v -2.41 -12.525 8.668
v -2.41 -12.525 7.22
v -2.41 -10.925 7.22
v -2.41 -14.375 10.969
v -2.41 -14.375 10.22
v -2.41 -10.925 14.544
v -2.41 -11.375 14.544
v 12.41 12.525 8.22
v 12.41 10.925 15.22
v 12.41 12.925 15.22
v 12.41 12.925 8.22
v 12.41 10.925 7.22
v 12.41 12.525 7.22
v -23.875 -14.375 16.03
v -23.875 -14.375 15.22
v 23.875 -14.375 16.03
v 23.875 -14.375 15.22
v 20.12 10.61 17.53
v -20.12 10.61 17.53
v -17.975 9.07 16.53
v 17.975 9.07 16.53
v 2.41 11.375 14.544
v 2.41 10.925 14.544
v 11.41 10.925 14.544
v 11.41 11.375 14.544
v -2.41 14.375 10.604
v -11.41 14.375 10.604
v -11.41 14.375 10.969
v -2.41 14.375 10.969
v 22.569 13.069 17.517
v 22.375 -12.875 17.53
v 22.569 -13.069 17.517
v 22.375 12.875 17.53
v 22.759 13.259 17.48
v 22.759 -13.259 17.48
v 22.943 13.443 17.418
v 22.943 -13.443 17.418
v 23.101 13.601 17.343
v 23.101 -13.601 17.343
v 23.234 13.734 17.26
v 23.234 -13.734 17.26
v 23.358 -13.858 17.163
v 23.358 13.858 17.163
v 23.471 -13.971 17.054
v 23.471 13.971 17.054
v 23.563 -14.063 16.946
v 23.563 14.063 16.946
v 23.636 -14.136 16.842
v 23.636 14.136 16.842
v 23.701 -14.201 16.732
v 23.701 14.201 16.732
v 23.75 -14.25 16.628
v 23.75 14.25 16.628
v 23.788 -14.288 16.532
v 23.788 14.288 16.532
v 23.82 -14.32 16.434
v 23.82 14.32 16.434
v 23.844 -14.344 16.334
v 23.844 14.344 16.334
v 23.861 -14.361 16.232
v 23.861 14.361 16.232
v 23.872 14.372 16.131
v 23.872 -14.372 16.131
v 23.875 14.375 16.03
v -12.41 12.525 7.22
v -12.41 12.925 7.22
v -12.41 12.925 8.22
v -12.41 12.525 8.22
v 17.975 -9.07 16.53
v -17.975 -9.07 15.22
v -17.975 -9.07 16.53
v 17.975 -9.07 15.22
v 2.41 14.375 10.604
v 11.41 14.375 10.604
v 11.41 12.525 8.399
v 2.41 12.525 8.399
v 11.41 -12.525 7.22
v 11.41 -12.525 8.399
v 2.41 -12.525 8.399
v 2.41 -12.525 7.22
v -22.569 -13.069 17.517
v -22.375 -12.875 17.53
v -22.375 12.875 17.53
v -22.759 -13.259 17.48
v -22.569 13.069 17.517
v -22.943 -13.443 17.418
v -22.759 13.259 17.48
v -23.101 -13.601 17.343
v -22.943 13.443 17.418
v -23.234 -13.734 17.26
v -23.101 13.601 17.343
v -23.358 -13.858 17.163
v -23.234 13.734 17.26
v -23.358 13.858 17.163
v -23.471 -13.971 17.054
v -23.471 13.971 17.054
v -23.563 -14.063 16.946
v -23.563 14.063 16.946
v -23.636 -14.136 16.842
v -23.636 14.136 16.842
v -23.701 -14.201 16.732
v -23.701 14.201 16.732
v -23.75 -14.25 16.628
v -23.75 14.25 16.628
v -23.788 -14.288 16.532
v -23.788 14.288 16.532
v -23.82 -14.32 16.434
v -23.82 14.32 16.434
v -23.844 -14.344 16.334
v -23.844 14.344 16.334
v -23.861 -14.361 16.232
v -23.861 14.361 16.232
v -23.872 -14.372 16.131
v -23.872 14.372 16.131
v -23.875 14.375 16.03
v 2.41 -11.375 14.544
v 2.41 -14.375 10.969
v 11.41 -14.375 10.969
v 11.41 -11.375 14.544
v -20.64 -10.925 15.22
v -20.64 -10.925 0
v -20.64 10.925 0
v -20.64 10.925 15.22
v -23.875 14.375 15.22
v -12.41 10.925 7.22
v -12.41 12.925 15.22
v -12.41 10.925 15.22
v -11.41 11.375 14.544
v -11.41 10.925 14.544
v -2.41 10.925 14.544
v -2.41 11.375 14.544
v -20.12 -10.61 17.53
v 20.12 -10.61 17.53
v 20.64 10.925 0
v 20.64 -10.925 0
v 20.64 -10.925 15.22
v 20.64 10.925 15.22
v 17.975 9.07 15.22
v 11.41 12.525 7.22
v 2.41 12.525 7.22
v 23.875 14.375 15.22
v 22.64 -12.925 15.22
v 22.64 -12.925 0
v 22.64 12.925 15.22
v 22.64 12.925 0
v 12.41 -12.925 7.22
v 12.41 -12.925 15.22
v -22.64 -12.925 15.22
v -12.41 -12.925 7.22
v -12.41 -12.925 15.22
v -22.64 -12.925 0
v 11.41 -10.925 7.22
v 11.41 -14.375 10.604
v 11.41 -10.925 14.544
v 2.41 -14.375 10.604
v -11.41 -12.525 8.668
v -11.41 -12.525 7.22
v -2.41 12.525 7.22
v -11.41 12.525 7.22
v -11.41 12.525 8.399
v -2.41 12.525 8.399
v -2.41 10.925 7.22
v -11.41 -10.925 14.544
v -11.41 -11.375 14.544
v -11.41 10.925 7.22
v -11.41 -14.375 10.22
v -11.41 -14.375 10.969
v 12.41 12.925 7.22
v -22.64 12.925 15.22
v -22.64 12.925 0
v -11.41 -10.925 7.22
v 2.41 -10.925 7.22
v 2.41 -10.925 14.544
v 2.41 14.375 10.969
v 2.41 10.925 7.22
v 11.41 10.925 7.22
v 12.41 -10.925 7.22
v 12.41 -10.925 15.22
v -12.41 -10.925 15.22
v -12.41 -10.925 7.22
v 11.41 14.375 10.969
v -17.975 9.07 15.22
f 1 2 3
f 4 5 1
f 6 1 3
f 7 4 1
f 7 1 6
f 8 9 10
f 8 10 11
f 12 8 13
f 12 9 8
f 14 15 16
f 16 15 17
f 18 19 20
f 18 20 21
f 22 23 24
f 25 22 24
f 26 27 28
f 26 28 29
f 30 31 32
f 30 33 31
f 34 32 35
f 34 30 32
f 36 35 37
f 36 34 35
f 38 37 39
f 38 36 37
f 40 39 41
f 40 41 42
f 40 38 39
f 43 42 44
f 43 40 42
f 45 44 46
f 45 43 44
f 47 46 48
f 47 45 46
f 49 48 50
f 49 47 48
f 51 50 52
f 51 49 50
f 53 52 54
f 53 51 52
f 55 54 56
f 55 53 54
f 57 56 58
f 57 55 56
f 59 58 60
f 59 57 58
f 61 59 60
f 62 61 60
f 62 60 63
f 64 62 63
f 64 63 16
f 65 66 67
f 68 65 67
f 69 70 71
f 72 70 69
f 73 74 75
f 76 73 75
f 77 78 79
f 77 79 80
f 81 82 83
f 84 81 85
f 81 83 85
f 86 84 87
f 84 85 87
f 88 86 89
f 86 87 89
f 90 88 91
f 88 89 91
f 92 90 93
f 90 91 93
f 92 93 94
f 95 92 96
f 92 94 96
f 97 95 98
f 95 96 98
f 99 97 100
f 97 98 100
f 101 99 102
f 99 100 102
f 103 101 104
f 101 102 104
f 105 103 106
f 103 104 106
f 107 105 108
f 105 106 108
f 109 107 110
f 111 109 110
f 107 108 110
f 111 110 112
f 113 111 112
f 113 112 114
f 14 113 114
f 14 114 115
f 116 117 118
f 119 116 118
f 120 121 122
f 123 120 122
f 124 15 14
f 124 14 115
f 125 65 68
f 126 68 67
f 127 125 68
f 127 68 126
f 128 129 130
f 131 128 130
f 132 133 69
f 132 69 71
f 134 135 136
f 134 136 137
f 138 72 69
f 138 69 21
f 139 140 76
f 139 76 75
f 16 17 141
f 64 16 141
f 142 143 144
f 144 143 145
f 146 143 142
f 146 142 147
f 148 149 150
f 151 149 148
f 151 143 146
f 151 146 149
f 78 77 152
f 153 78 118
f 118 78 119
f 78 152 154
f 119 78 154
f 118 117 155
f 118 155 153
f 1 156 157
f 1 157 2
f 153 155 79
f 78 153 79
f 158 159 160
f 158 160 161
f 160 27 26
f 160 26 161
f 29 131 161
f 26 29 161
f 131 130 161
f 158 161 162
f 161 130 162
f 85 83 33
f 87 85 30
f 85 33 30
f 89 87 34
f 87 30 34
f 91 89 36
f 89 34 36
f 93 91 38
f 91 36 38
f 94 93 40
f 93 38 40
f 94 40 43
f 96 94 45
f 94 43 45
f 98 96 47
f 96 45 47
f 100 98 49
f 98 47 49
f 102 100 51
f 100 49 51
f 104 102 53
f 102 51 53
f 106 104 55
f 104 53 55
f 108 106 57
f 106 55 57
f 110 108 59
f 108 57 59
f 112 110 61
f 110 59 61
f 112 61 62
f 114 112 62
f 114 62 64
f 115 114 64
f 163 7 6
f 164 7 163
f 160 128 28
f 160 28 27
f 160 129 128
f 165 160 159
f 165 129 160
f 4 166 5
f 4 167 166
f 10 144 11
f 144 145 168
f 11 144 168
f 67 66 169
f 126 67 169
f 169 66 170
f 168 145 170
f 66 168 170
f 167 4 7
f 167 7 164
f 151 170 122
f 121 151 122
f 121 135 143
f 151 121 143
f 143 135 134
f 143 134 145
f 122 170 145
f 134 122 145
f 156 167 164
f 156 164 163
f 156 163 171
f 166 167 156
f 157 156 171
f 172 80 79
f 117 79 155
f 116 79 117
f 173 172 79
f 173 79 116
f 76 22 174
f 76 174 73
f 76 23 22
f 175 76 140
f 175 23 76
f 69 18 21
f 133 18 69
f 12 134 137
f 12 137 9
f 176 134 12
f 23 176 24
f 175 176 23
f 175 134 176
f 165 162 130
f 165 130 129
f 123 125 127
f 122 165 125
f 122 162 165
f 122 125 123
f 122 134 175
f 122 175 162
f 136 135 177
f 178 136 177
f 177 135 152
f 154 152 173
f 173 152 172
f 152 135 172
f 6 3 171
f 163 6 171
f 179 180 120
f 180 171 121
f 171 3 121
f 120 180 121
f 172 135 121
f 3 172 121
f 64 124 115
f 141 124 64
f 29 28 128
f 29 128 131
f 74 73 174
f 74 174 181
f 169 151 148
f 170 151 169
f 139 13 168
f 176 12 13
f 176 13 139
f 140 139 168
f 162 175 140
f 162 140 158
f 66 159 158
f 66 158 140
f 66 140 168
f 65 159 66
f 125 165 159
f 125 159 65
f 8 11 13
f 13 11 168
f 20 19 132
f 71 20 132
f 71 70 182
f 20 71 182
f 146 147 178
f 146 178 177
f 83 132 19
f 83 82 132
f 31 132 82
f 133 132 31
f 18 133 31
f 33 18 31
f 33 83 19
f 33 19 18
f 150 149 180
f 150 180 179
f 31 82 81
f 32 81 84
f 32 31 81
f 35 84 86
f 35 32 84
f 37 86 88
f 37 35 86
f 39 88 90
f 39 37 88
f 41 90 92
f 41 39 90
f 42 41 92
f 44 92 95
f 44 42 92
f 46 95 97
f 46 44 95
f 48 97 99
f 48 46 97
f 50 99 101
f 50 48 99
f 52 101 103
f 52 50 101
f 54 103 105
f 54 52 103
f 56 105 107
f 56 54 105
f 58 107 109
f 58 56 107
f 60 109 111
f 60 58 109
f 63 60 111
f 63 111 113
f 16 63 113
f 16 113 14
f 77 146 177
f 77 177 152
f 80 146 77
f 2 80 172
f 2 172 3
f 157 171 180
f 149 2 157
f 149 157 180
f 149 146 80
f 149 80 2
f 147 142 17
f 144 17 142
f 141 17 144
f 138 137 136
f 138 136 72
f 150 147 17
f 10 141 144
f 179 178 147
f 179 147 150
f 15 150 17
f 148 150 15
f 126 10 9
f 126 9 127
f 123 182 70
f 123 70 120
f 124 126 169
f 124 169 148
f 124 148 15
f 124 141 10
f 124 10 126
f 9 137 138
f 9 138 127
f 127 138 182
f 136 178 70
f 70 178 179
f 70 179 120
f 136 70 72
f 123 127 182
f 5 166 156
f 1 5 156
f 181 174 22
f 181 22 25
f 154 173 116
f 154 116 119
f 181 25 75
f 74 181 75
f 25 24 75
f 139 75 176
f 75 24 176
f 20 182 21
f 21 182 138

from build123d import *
from OCP.BRepFilletAPI import BRepFilletAPI_MakeChamfer

# Parameters (mm, degrees)
ESBO_O1_W                  = 47.75
ESBO_O1_H                  = 28.75
RESSALTO_EXTRUS_O1_DEPTH   = 17.53
ESBO_O3_W                  = 55.113346814
ESBO_O3_H                  = 32.23245858
ESBO_O3_W_2                = 45.28
ESBO_O3_H_2                = 25.85
CORTE_EXTRUS_O1_DEPTH      = 15.22
CORTE_EXTRUS_O2_DEPTH      = 17
CORTE_EXTRUS_O2_DEPTH_BACK = 33.22
ESBO_O4_W                  = 35.95
ESBO_O4_H                  = 18.14
ESBO_O5_W                  = 41.28
ESBO_O5_H                  = 21.85
CORTE_EXTRUS_O3_DEPTH      = 15.22
CHANFRO1_SIZE              = 1
CHANFRO1_SIZE2             = 2.144506921
CHANFRO2_SIZE              = 1
CHANFRO2_SIZE2             = 2.144506921
CHANFRO3_SIZE              = 1
CHANFRO3_SIZE2             = 1.539864964
FILETE1_R                  = 1.5
CORTE_EXTRUS_O4_DEPTH      = 15
CORTE_EXTRUS_O4_DEPTH_BACK = 44.22
CORTE_EXTRUS_O5_DEPTH      = 0.4
ESBO_O8_W                  = 24.82
ESBO_O8_H                  = 1
CORTE_EXTRUS_O6_DEPTH      = 0.4
ESBO_O9_W                  = 9
ESBO_O9_H                  = 6.324480946
RESSALTO_EXTRUS_O2_DEPTH   = 1.45
ESBO_O10_W                 = 9
ESBO_O10_H                 = 6.324480946
RESSALTO_EXTRUS_O3_DEPTH   = 1.45
ESBO_O11_W                 = 9
ESBO_O11_H                 = 6.324480946
RESSALTO_EXTRUS_O4_DEPTH   = 1.45
CHANFRO4_SIZE              = 3
CHANFRO4_SIZE2             = 3.575260778


with BuildPart() as part:
    # Esboço1 → Ressalto-extrusão1 (new body)
    with BuildSketch(Plane.XY):
        Rectangle(ESBO_O1_W, ESBO_O1_H)
    extrude(amount=RESSALTO_EXTRUS_O1_DEPTH)

    # Esboço3 → Corte-extrusão1 (cut)
    with BuildSketch(Plane(origin=(0, 0, 0), x_dir=(-1, 0, 0), z_dir=(0, 0, -1))):
        Rectangle(ESBO_O3_W, ESBO_O3_H)
        Rectangle(ESBO_O3_W_2, ESBO_O3_H_2, mode=Mode.SUBTRACT)
    extrude(amount=-CORTE_EXTRUS_O1_DEPTH, mode=Mode.SUBTRACT)

    # Esboço4 → Corte-extrusão2 (cut, two sides: drawn at the far end of the back side and taken through both)
    with BuildSketch(Plane.XY.offset(17.53).offset(-CORTE_EXTRUS_O2_DEPTH_BACK)):
        Rectangle(ESBO_O4_W, ESBO_O4_H)
    extrude(amount=CORTE_EXTRUS_O2_DEPTH + CORTE_EXTRUS_O2_DEPTH_BACK, mode=Mode.SUBTRACT)

    # Esboço5 → Corte-extrusão3 (cut)
    with BuildSketch(Plane(origin=(0, 0, 0), x_dir=(-1, 0, 0), z_dir=(0, 0, -1))):
        Rectangle(ESBO_O5_W, ESBO_O5_H)
    extrude(amount=-CORTE_EXTRUS_O3_DEPTH, mode=Mode.SUBTRACT)

    # Chanfro1
    chanfro1_edges = [part.edges().sort_by_distance(p)[0] for p in [
        (17.975, 0, 17.53),
    ]]
    chanfro1_side = [part.faces().sort_by_distance(p)[0] for p in [
        (17.975, 0, 16.375),
    ]]
    chamfer(chanfro1_edges, length=CHANFRO1_SIZE, length2=CHANFRO1_SIZE2, reference=chanfro1_side[0])

    # Chanfro2
    chanfro2_edges = [part.edges().sort_by_distance(p)[0] for p in [
        (-17.975, 0, 17.53),
    ]]
    chanfro2_side = [part.faces().sort_by_distance(p)[0] for p in [
        (-17.975, 0, 16.375),
    ]]
    chamfer(chanfro2_edges, length=CHANFRO2_SIZE, length2=CHANFRO2_SIZE2, reference=chanfro2_side[0])

    # Chanfro3: one chamfer whose edges measure the first distance from different faces: ONE call of the kernel's chamfer builder (chamfer() names one face for all edges)
    chanfro3_edges_1 = [part.edges().sort_by_distance(p)[0] for p in [
        (0, -9.07, 17.53),
    ]]
    chanfro3_side_1 = [part.faces().sort_by_distance(p)[0] for p in [
        (0, -9.07, 16.39568424),
    ]]
    chanfro3_edges_2 = [part.edges().sort_by_distance(p)[0] for p in [
        (0, 9.07, 17.53),
    ]]
    chanfro3_side_2 = [part.faces().sort_by_distance(p)[0] for p in [
        (0, 9.07, 16.39568424),
    ]]
    chanfro3 = BRepFilletAPI_MakeChamfer(part.part.solid().wrapped)
    for e in chanfro3_edges_1:
        chanfro3.Add(CHANFRO3_SIZE, CHANFRO3_SIZE2, e.wrapped, chanfro3_side_1[0].wrapped)  # the first distance lies on this face
    for e in chanfro3_edges_2:
        chanfro3.Add(CHANFRO3_SIZE, CHANFRO3_SIZE2, e.wrapped, chanfro3_side_2[0].wrapped)  # the first distance lies on this face
    add(Compound.cast(chanfro3.Shape()), mode=Mode.REPLACE)

    # Filete1
    filete1_edges = [part.edges().sort_by_distance(p)[0] for p in [
        (23.875, 0, 17.53),
        (0, 14.375, 17.53),
        (-23.875, 0, 17.53),
        (0, -14.375, 17.53),
    ]]
    fillet(filete1_edges, radius=FILETE1_R)

    # Esboço6 → Corte-extrusão4 (cut, two sides: drawn at the far end of the back side and taken through both)
    with BuildSketch(Plane(origin=(0, 12.925, 0), x_dir=(1, 0, 0), z_dir=(0, 1, 0)).offset(-CORTE_EXTRUS_O4_DEPTH_BACK)):
        Polygon((-11.41, -7.895519054), (-11.41, -7.22), (-12.41, -7.22), (-12.41, -15.22), (12.41, -15.22), (12.41, -7.22), (11.41, -7.22), (11.41, -7.895519054), (11.41, -14.544480946), (2.41, -14.544480946), (2.41, -7.22), (-2.41, -7.22), (-2.41, -14.544480946), (-11.41, -14.544480946), align=None)
    extrude(amount=CORTE_EXTRUS_O4_DEPTH + CORTE_EXTRUS_O4_DEPTH_BACK, mode=Mode.SUBTRACT)

    # Esboço7 → Corte-extrusão5 (cut)
    with BuildSketch(Plane(origin=(0, 12.925, 0), x_dir=(1, 0, 0), z_dir=(0, 1, 0))):
        Polygon((-12.410087555, -8.22), (12.410087555, -8.22), (12.41, -7.22), (-12.41, -7.22), align=None)
    extrude(amount=-CORTE_EXTRUS_O5_DEPTH, mode=Mode.SUBTRACT)

    # Esboço8 → Corte-extrusão6 (cut)
    with BuildSketch(Plane.XZ.offset(12.925)):
        with Locations((0, 7.72)):
            Rectangle(ESBO_O8_W, ESBO_O8_H)
    extrude(amount=-CORTE_EXTRUS_O6_DEPTH, mode=Mode.SUBTRACT)

    # Esboço9 → Ressalto-extrusão2 (add)
    with BuildSketch(Plane(origin=(0, 12.925, 0), x_dir=(1, 0, 0), z_dir=(0, 1, 0))):
        with Locations((-6.91, -11.382240473)):
            Rectangle(ESBO_O9_W, ESBO_O9_H)
    extrude(amount=RESSALTO_EXTRUS_O2_DEPTH)

    # Esboço10 → Ressalto-extrusão3 (add)
    with BuildSketch(Plane(origin=(0, 12.925, 0), x_dir=(1, 0, 0), z_dir=(0, 1, 0))):
        with Locations((6.91, -11.382240473)):
            Rectangle(ESBO_O10_W, ESBO_O10_H)
    extrude(amount=RESSALTO_EXTRUS_O3_DEPTH)

    # Esboço11 → Ressalto-extrusão4 (add)
    with BuildSketch(Plane.XZ.offset(12.925)):
        with Locations((6.91, 11.382240473)):
            Rectangle(ESBO_O11_W, ESBO_O11_H)
        Polygon((-2.41, 8.22), (-2.41, 14.544480946), (-6.91, 14.544480946), (-11.41, 14.544480946), (-11.41, 8.22), align=None)
    extrude(amount=RESSALTO_EXTRUS_O4_DEPTH)

    # Chanfro4: one chamfer whose edges measure the first distance from different faces: ONE call of the kernel's chamfer builder (chamfer() names one face for all edges)
    chanfro4_edges_1 = [part.edges().sort_by_distance(p)[0] for p in [
        (-6.91, 14.375, 14.544480946),
    ]]
    chanfro4_side_1 = [part.faces().sort_by_distance(p)[0] for p in [
        (-6.91, 12.65, 14.544480946),
    ]]
    chanfro4_edges_2 = [part.edges().sort_by_distance(p)[0] for p in [
        (6.91, 14.375, 14.544480946),
    ]]
    chanfro4_side_2 = [part.faces().sort_by_distance(p)[0] for p in [
        (6.91, 12.65, 14.544480946),
    ]]
    chanfro4_edges_3 = [part.edges().sort_by_distance(p)[0] for p in [
        (6.91, -14.375, 14.544480946),
    ]]
    chanfro4_side_3 = [part.faces().sort_by_distance(p)[0] for p in [
        (6.91, -12.65, 14.544480946),
    ]]
    chanfro4_edges_4 = [part.edges().sort_by_distance(p)[0] for p in [
        (-6.91, -14.375, 14.544480946),
    ]]
    chanfro4_side_4 = [part.faces().sort_by_distance(p)[0] for p in [
        (-6.91, -12.65, 14.544480946),
    ]]
    chanfro4 = BRepFilletAPI_MakeChamfer(part.part.solid().wrapped)
    for e in chanfro4_edges_1:
        chanfro4.Add(CHANFRO4_SIZE, CHANFRO4_SIZE2, e.wrapped, chanfro4_side_1[0].wrapped)  # the first distance lies on this face
    for e in chanfro4_edges_2:
        chanfro4.Add(CHANFRO4_SIZE, CHANFRO4_SIZE2, e.wrapped, chanfro4_side_2[0].wrapped)  # the first distance lies on this face
    for e in chanfro4_edges_3:
        chanfro4.Add(CHANFRO4_SIZE, CHANFRO4_SIZE2, e.wrapped, chanfro4_side_3[0].wrapped)  # the first distance lies on this face
    for e in chanfro4_edges_4:
        chanfro4.Add(CHANFRO4_SIZE, CHANFRO4_SIZE2, e.wrapped, chanfro4_side_4[0].wrapped)  # the first distance lies on this face
    add(Compound.cast(chanfro4.Shape()), mode=Mode.REPLACE)

    # Chanfro5
    # the kernel refuses this chamfer: 2.383507185, 2 mm, written as the material it takes off along each edge
    with BuildSketch(Plane(origin=(-11.41, 14.375, 8.22), x_dir=(0, 0.024939322090234445, 0.9996889667359941), z_dir=(1, 0, 0))) as chanfro5_piece_1_section:
        with BuildLine():
            Line((2.457306387, 0), (-0.124419196, 2.058820987))
            Line((-0.124419196, 2.058820987), (-0.172074512, 2.057632126))
            ThreePointArc((-0.172074512, 2.057632126), (-0.073358824, 1.029132353), (-0.047655317, -0.001188861))
            Line((-0.047655317, -0.001188861), (0.001188861, -0.047655317))
            ThreePointArc((0.001188861, -0.047655317), (1.229077869, -0.01702307), (2.458495248, -0.047655317))
            Line((2.458495248, -0.047655317), (2.457306387, 0))
        make_face()
    chanfro5_piece_1 = extrude(amount=9, mode=Mode.PRIVATE)
    chanfro5_piece_1 = split(chanfro5_piece_1, bisect_by=Plane(origin=(-6.91, 12.525, 9.020332746), z_dir=(0, 1, 0)), keep=Keep.TOP, mode=Mode.PRIVATE)
    add(chanfro5_piece_1, mode=Mode.SUBTRACT)
    with BuildSketch(Plane(origin=(11.41, 14.375, 8.22), x_dir=(0, 0.024939322090234445, 0.9996889667359941), z_dir=(-1, 0, 0))) as chanfro5_piece_2_section:
        with BuildLine():
            Line((2.457306387, 0), (-0.124419196, -2.058820987))
            Line((-0.124419196, -2.058820987), (-0.172074512, -2.057632126))
            ThreePointArc((-0.172074512, -2.057632126), (-0.073358824, -1.029132353), (-0.047655317, 0.001188861))
            Line((-0.047655317, 0.001188861), (0.001188861, 0.047655317))
            ThreePointArc((0.001188861, 0.047655317), (1.229077869, 0.01702307), (2.458495248, 0.047655317))
            Line((2.458495248, 0.047655317), (2.457306387, 0))
        make_face()
    chanfro5_piece_2 = extrude(amount=9, mode=Mode.PRIVATE)
    chanfro5_piece_2 = split(chanfro5_piece_2, bisect_by=Plane(origin=(6.91, 12.525, 9.020332746), z_dir=(0, 1, 0)), keep=Keep.TOP, mode=Mode.PRIVATE)
    add(chanfro5_piece_2, mode=Mode.SUBTRACT)
    with BuildSketch(Plane(origin=(2.41, -14.375, 8.22), x_dir=(0, -0.024939322090234445, 0.9996889667359941), z_dir=(1, 0, 0))) as chanfro5_piece_3_section:
        with BuildLine():
            Line((2.457306387, 0), (-0.124419196, -2.058820987))
            Line((-0.124419196, -2.058820987), (-0.172074512, -2.057632126))
            ThreePointArc((-0.172074512, -2.057632126), (-0.073358824, -1.029132353), (-0.047655317, 0.001188861))
            Line((-0.047655317, 0.001188861), (0.001188861, 0.047655317))
            ThreePointArc((0.001188861, 0.047655317), (1.229077869, 0.01702307), (2.458495248, 0.047655317))
            Line((2.458495248, 0.047655317), (2.457306387, 0))
        make_face()
    chanfro5_piece_3 = extrude(amount=9, mode=Mode.PRIVATE)
    chanfro5_piece_3 = split(chanfro5_piece_3, bisect_by=Plane(origin=(6.91, -12.525, 9.020332746), z_dir=(0, -1, 0)), keep=Keep.TOP, mode=Mode.PRIVATE)
    add(chanfro5_piece_3, mode=Mode.SUBTRACT)
    with BuildSketch(Plane(origin=(-11.41, -14.375, 8.22), x_dir=(0, -0.03540953691366296, 0.9993728857116145), z_dir=(1, 0, 0))) as chanfro5_piece_4_section:
        with BuildLine():
            Line((2.062577027, 0), (-0.148230141, -2.452831528))
            Line((-0.148230141, -2.452831528), (-0.19587039, -2.45114355))
            ThreePointArc((-0.19587039, -2.45114355), (-0.091132758, -1.225812797), (-0.047640249, 0.001687978))
            Line((-0.047640249, 0.001687978), (0.001687978, 0.047640249))
            ThreePointArc((0.001687978, 0.047640249), (1.031683425, 0.011145701), (2.064265005, 0.047640249))
            Line((2.064265005, 0.047640249), (2.062577027, 0))
        make_face()
    chanfro5_piece_4 = extrude(amount=9, mode=Mode.PRIVATE)
    chanfro5_piece_4 = split(chanfro5_piece_4, bisect_by=Plane(origin=(-6.91, -12.525, 8.913974099), z_dir=(0, -1, 0)), keep=Keep.TOP, mode=Mode.PRIVATE)
    add(chanfro5_piece_4, mode=Mode.SUBTRACT)


solid = part.part
